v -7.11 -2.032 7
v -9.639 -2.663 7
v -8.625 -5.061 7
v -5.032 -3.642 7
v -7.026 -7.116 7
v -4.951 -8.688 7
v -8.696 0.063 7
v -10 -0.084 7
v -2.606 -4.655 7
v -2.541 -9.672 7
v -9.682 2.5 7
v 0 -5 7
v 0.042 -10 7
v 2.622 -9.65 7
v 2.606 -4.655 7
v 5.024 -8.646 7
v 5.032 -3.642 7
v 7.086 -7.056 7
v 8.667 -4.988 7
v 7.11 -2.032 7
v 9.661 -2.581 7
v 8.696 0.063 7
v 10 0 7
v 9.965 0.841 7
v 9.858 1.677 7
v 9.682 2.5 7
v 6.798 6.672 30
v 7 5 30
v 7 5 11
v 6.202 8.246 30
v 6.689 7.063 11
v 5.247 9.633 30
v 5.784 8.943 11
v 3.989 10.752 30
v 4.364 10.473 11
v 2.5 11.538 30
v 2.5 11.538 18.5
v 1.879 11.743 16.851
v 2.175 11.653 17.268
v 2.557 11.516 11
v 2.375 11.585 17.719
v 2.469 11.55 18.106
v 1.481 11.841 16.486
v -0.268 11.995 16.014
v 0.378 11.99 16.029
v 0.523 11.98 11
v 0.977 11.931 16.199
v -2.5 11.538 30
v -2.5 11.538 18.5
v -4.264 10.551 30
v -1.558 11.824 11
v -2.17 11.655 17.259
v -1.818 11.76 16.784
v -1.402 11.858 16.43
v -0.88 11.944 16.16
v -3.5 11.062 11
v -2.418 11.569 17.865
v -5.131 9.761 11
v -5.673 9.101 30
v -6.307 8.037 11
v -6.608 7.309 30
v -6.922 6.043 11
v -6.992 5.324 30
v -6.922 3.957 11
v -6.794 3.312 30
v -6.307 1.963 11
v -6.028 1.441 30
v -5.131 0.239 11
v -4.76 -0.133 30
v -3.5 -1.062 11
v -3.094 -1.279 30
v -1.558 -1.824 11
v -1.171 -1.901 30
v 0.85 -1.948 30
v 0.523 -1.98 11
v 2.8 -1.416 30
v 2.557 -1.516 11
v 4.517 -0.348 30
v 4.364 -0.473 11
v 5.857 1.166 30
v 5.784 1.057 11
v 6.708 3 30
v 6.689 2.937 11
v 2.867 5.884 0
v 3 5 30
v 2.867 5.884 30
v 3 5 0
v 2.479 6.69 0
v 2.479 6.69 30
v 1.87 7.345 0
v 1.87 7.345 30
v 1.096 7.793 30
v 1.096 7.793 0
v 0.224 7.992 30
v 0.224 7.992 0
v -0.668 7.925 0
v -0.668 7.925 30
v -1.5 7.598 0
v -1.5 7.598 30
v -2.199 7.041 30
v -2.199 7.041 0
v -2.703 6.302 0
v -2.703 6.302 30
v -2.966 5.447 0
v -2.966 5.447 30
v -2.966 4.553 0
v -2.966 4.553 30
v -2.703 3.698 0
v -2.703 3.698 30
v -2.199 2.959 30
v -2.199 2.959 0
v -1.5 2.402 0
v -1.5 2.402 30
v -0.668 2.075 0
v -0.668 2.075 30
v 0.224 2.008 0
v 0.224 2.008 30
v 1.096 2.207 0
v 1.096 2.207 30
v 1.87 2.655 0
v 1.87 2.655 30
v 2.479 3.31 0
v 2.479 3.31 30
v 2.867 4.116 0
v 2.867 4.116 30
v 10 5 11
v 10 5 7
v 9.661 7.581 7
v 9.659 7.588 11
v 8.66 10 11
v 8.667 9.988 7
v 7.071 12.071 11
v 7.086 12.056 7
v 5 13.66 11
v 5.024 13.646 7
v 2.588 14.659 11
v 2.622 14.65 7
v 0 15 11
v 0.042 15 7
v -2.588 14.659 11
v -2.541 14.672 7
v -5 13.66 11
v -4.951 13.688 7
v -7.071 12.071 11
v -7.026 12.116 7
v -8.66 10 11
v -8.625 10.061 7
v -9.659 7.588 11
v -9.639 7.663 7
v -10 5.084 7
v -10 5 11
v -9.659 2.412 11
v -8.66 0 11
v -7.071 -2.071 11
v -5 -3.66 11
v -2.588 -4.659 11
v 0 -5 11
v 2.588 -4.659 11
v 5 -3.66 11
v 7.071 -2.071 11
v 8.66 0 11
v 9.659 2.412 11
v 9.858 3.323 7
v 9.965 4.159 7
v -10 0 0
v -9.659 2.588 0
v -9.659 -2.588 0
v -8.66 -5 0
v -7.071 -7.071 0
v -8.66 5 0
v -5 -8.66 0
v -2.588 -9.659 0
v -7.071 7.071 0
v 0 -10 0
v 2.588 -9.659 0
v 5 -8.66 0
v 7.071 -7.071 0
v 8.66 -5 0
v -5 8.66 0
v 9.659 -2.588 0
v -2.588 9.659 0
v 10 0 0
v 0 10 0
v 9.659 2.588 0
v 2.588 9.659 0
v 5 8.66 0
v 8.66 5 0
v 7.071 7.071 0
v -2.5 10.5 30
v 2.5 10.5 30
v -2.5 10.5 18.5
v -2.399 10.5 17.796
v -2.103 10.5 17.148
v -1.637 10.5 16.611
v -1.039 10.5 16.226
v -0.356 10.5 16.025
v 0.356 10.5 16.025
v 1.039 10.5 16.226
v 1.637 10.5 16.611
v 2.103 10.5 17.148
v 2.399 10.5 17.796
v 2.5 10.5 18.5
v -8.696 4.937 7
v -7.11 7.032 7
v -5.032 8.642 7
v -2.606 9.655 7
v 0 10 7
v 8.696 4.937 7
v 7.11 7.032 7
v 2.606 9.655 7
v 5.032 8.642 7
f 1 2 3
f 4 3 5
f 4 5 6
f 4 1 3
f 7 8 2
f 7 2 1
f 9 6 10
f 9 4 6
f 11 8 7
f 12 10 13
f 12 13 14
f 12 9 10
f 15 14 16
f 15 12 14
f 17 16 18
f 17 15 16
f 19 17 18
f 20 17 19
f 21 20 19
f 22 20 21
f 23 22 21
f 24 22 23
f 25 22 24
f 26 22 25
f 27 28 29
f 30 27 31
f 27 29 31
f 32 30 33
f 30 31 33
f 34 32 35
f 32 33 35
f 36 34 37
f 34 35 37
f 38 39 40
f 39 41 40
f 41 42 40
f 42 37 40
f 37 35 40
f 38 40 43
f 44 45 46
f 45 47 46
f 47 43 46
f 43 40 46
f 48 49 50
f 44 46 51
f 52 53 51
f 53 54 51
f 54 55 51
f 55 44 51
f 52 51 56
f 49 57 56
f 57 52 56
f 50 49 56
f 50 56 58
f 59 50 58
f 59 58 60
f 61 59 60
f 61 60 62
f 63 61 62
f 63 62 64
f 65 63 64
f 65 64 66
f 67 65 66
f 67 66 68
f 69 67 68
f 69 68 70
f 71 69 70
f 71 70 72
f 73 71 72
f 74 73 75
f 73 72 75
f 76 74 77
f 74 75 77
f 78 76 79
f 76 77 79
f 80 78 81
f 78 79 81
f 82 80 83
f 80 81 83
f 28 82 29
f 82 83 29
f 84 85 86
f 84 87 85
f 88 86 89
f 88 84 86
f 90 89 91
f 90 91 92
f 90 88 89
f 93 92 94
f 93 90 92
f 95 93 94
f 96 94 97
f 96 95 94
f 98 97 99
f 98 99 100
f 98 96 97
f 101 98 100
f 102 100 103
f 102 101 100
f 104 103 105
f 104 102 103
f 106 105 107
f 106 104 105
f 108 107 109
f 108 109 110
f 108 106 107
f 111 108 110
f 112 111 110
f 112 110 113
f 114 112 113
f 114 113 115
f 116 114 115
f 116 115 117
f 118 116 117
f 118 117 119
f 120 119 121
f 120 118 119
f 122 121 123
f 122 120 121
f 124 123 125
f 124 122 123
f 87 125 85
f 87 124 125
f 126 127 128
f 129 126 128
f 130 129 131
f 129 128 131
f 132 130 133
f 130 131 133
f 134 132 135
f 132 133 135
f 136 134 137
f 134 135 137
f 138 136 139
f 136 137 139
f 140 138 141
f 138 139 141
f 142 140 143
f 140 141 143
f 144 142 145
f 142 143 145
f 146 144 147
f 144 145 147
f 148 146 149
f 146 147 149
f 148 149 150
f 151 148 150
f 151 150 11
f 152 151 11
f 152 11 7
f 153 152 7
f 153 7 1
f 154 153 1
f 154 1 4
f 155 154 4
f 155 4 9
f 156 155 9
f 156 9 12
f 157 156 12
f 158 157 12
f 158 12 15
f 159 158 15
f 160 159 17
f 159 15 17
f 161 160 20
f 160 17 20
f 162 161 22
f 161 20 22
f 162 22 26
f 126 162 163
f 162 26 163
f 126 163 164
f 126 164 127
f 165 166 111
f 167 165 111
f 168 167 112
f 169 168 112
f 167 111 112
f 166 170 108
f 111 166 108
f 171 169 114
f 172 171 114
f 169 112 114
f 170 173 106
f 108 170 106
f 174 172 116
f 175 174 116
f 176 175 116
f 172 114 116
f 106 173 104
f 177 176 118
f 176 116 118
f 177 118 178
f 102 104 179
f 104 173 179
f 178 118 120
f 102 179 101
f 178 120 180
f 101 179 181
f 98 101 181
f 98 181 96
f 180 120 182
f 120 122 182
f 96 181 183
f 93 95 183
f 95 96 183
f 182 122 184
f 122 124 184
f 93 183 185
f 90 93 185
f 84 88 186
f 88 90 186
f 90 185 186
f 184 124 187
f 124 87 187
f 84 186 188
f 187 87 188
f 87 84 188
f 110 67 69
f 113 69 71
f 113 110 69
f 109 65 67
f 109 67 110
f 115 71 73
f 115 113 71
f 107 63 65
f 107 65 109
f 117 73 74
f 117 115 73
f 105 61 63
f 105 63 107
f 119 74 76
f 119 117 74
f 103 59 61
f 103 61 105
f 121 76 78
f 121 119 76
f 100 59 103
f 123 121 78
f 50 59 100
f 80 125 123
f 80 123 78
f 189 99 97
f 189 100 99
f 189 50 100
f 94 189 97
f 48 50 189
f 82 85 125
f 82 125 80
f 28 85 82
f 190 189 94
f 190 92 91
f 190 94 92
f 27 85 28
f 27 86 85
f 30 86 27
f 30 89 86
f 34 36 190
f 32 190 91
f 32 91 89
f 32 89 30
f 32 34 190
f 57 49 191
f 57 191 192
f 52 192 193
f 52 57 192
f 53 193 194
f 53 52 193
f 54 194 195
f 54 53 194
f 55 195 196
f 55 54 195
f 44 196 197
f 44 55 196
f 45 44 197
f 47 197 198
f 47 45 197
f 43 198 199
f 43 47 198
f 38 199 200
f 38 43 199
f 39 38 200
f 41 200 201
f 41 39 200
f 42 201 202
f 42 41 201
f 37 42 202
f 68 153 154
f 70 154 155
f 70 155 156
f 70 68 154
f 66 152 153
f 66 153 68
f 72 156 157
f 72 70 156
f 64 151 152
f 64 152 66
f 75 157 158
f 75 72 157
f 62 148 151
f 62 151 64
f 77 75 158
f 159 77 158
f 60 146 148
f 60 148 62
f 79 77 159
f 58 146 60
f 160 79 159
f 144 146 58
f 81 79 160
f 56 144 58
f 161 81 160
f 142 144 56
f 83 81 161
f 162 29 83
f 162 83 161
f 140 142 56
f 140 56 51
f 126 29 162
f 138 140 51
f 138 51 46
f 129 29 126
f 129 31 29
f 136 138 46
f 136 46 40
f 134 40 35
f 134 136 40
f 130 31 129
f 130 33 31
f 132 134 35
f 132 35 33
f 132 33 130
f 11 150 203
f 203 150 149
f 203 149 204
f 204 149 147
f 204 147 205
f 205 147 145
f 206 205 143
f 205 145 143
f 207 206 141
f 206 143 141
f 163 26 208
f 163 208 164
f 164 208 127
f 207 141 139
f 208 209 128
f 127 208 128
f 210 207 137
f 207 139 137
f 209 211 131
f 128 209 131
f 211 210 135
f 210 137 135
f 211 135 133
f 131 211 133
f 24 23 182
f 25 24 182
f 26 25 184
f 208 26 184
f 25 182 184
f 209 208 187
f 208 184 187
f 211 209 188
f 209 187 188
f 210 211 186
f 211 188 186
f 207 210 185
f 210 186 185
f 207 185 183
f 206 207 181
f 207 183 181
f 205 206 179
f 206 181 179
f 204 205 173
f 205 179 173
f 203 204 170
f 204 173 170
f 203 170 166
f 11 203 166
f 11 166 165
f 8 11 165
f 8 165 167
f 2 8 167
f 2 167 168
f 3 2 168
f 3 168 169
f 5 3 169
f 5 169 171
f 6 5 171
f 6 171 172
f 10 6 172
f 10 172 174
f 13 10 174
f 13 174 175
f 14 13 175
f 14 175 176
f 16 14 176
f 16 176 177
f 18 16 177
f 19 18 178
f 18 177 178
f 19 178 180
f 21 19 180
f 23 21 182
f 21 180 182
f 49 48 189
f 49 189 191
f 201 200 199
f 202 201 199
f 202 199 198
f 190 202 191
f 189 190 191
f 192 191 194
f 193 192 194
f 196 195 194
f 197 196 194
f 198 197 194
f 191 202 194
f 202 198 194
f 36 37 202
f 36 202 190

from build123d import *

# Parameters (mm, degrees)
SKETCH1_R           = 10
SKETCH1_R_2         = 3
BOSS_EXTRUDE1_DEPTH = 7
SKETCH2_R           = 10
SKETCH2_R_2         = 3
BOSS_EXTRUDE2_DEPTH = 4
SKETCH3_R           = 7
SKETCH3_R_2         = 3
BOSS_EXTRUDE3_DEPTH = 19
CUT_EXTRUDE1_START  = 20.5
CUT_EXTRUDE1_DEPTH  = 10


with BuildPart() as part:
    # Sketch1 → Boss-Extrude1 (new body)
    with BuildSketch(Plane.XY):
        Circle(SKETCH1_R)
        with Locations((0, 5)):
            Circle(SKETCH1_R_2, mode=Mode.SUBTRACT)
    extrude(amount=BOSS_EXTRUDE1_DEPTH)

    # Sketch2 → Boss-Extrude2 (add)
    with BuildSketch(Plane.XY.offset(7)):
        with Locations((0, 5)):
            Circle(SKETCH2_R)
        with Locations((0, 5)):
            Circle(SKETCH2_R_2, mode=Mode.SUBTRACT)
    extrude(amount=BOSS_EXTRUDE2_DEPTH)

    # Sketch3 → Boss-Extrude3 (add)
    with BuildSketch(Plane.XY.offset(11)):
        with Locations((0, 5)):
            Circle(SKETCH3_R)
        with Locations((0, 5)):
            Circle(SKETCH3_R_2, mode=Mode.SUBTRACT)
    extrude(amount=BOSS_EXTRUDE3_DEPTH)

    # Sketch5 → Cut-Extrude1 (cut)
    with BuildSketch(Plane(origin=(0, 0, 0), x_dir=(1, 0, 0), z_dir=(0, 1, 0)).offset(CUT_EXTRUDE1_START)):
        with BuildLine():
            Line((2.5, -44), (-2.5, -44))
            Line((-2.5, -44), (-2.5, -18.5))
            ThreePointArc((-2.5, -18.5), (0, -16), (2.5, -18.5))
            Line((2.5, -18.5), (2.5, -44))
        make_face()
    extrude(amount=-CUT_EXTRUDE1_DEPTH, mode=Mode.SUBTRACT)


solid = part.part
